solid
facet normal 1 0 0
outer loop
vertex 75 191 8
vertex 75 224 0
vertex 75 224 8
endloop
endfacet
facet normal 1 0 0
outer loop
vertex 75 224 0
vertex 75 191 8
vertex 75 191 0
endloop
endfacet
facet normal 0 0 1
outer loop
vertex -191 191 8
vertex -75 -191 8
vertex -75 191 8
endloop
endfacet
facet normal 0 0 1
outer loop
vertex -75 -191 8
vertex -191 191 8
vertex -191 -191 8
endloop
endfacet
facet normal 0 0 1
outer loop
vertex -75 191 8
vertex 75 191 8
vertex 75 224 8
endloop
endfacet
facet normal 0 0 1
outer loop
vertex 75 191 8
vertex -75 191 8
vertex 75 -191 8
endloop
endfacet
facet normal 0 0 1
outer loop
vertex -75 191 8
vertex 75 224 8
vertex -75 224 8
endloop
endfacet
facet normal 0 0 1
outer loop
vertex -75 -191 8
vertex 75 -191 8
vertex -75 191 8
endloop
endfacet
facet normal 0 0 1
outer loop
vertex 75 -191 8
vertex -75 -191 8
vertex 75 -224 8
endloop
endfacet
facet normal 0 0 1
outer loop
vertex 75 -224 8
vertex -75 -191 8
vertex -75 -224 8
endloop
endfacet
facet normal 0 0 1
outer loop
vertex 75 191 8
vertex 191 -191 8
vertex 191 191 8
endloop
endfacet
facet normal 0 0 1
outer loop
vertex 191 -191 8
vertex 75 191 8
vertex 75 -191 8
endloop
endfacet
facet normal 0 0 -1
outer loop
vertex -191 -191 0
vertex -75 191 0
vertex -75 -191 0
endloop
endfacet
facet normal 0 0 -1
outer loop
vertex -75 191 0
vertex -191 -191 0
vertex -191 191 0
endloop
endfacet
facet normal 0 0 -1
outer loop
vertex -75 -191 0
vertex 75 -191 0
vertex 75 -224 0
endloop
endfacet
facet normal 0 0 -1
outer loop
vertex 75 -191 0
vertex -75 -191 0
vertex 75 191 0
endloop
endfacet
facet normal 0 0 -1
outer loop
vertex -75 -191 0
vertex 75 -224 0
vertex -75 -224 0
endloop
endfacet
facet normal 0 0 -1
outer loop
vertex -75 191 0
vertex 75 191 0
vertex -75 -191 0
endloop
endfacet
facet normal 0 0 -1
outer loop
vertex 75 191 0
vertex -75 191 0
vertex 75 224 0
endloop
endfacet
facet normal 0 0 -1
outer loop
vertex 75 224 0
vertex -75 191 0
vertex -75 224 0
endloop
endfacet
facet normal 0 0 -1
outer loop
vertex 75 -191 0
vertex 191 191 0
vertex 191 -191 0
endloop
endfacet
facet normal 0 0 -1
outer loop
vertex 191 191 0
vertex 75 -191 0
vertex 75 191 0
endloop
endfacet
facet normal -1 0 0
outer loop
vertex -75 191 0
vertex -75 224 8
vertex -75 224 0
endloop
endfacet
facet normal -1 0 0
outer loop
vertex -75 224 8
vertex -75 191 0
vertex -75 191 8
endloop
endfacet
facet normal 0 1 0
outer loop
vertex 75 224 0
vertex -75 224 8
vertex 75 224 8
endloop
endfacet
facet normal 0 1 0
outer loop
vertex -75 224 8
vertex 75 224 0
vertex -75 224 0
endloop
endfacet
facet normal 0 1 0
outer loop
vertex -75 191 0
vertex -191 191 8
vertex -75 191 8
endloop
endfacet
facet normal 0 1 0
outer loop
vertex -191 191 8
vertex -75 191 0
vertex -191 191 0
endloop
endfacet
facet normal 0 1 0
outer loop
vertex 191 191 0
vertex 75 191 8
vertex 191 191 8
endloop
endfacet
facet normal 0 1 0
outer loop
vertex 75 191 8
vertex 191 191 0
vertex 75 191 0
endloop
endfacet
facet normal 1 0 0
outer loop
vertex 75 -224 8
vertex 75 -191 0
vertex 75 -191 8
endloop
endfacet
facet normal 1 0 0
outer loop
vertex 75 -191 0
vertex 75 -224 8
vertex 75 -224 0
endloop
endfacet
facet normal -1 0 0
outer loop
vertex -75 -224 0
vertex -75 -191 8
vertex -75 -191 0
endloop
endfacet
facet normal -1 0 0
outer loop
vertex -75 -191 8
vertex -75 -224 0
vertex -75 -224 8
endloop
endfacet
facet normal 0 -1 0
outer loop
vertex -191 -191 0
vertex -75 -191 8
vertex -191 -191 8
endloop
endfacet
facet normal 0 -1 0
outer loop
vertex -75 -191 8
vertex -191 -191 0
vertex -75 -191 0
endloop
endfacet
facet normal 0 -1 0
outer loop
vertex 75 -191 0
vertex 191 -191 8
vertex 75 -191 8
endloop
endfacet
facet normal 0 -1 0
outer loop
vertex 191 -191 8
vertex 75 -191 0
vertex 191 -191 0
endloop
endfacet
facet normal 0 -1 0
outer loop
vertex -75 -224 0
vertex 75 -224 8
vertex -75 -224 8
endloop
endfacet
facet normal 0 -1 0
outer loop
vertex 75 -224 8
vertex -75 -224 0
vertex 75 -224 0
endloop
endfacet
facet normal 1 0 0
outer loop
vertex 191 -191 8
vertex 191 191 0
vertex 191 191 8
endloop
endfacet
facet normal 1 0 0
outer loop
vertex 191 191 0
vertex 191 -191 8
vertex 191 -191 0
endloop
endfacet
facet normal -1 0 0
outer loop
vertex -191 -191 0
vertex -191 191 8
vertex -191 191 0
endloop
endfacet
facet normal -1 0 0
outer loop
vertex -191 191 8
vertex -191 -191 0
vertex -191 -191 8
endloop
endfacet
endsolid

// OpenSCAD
// file: global.scad
// all measures in mm

$fn = 100;
nothing = 0.01;

material_x = 510;
material_y = 370;
material_width = 8;

// Measures of the top plate
top_x = 550;
top_y = 550;

// Leg measurements
leg_x = 450;
leg_z = 950;

// about hoch much the faces in Y direction are inset
face_y_inset = 30;

// how far the joint extends planarly from the face
joint_x = 30;

// Assume same material measure as for X plane
leg_y = leg_x - joint_x*2;

// the lateral width of the joint
joint_y = 50;
// how far down the hook extends
joint_hook_y = 50;

joint_total_height = joint_y + joint_hook_y;

num_joints = 4;
q = leg_z/(num_joints+1);
joint_height = [q, 2*q, 3*q, 4*q];

// Top nose configuration
nose_width = 100;
nose_z = material_width;

// Bottom plate configuration
bottom_x = leg_x - 2*face_y_inset - material_width;
bottom_y = leg_y - material_width;
bottom_nose_width = 150;
bottom_nose_height = joint_x + material_width - 5;
bottom_elevation = 40;

// how far apart from on another to project the parts
projection_spacing = 1;
// main file
include <global.scad>;

module bottom()
{
    color("cyan")
    {
        // Base plate
        translate([0, 0, material_width/2])
        cube([
            bottom_x,
            bottom_y,
            material_width
            ], center=true);

        // Noses
        for (y = [
                + bottom_y/2 + bottom_nose_height/2,
                - bottom_y/2 - bottom_nose_height/2
                ])
        {
            translate([
                0,
                y,
                material_width/2
                ])
            cube([
                bottom_nose_width,
                bottom_nose_height,
                material_width
                ], center=true);
        }
    }
}

bottom();
